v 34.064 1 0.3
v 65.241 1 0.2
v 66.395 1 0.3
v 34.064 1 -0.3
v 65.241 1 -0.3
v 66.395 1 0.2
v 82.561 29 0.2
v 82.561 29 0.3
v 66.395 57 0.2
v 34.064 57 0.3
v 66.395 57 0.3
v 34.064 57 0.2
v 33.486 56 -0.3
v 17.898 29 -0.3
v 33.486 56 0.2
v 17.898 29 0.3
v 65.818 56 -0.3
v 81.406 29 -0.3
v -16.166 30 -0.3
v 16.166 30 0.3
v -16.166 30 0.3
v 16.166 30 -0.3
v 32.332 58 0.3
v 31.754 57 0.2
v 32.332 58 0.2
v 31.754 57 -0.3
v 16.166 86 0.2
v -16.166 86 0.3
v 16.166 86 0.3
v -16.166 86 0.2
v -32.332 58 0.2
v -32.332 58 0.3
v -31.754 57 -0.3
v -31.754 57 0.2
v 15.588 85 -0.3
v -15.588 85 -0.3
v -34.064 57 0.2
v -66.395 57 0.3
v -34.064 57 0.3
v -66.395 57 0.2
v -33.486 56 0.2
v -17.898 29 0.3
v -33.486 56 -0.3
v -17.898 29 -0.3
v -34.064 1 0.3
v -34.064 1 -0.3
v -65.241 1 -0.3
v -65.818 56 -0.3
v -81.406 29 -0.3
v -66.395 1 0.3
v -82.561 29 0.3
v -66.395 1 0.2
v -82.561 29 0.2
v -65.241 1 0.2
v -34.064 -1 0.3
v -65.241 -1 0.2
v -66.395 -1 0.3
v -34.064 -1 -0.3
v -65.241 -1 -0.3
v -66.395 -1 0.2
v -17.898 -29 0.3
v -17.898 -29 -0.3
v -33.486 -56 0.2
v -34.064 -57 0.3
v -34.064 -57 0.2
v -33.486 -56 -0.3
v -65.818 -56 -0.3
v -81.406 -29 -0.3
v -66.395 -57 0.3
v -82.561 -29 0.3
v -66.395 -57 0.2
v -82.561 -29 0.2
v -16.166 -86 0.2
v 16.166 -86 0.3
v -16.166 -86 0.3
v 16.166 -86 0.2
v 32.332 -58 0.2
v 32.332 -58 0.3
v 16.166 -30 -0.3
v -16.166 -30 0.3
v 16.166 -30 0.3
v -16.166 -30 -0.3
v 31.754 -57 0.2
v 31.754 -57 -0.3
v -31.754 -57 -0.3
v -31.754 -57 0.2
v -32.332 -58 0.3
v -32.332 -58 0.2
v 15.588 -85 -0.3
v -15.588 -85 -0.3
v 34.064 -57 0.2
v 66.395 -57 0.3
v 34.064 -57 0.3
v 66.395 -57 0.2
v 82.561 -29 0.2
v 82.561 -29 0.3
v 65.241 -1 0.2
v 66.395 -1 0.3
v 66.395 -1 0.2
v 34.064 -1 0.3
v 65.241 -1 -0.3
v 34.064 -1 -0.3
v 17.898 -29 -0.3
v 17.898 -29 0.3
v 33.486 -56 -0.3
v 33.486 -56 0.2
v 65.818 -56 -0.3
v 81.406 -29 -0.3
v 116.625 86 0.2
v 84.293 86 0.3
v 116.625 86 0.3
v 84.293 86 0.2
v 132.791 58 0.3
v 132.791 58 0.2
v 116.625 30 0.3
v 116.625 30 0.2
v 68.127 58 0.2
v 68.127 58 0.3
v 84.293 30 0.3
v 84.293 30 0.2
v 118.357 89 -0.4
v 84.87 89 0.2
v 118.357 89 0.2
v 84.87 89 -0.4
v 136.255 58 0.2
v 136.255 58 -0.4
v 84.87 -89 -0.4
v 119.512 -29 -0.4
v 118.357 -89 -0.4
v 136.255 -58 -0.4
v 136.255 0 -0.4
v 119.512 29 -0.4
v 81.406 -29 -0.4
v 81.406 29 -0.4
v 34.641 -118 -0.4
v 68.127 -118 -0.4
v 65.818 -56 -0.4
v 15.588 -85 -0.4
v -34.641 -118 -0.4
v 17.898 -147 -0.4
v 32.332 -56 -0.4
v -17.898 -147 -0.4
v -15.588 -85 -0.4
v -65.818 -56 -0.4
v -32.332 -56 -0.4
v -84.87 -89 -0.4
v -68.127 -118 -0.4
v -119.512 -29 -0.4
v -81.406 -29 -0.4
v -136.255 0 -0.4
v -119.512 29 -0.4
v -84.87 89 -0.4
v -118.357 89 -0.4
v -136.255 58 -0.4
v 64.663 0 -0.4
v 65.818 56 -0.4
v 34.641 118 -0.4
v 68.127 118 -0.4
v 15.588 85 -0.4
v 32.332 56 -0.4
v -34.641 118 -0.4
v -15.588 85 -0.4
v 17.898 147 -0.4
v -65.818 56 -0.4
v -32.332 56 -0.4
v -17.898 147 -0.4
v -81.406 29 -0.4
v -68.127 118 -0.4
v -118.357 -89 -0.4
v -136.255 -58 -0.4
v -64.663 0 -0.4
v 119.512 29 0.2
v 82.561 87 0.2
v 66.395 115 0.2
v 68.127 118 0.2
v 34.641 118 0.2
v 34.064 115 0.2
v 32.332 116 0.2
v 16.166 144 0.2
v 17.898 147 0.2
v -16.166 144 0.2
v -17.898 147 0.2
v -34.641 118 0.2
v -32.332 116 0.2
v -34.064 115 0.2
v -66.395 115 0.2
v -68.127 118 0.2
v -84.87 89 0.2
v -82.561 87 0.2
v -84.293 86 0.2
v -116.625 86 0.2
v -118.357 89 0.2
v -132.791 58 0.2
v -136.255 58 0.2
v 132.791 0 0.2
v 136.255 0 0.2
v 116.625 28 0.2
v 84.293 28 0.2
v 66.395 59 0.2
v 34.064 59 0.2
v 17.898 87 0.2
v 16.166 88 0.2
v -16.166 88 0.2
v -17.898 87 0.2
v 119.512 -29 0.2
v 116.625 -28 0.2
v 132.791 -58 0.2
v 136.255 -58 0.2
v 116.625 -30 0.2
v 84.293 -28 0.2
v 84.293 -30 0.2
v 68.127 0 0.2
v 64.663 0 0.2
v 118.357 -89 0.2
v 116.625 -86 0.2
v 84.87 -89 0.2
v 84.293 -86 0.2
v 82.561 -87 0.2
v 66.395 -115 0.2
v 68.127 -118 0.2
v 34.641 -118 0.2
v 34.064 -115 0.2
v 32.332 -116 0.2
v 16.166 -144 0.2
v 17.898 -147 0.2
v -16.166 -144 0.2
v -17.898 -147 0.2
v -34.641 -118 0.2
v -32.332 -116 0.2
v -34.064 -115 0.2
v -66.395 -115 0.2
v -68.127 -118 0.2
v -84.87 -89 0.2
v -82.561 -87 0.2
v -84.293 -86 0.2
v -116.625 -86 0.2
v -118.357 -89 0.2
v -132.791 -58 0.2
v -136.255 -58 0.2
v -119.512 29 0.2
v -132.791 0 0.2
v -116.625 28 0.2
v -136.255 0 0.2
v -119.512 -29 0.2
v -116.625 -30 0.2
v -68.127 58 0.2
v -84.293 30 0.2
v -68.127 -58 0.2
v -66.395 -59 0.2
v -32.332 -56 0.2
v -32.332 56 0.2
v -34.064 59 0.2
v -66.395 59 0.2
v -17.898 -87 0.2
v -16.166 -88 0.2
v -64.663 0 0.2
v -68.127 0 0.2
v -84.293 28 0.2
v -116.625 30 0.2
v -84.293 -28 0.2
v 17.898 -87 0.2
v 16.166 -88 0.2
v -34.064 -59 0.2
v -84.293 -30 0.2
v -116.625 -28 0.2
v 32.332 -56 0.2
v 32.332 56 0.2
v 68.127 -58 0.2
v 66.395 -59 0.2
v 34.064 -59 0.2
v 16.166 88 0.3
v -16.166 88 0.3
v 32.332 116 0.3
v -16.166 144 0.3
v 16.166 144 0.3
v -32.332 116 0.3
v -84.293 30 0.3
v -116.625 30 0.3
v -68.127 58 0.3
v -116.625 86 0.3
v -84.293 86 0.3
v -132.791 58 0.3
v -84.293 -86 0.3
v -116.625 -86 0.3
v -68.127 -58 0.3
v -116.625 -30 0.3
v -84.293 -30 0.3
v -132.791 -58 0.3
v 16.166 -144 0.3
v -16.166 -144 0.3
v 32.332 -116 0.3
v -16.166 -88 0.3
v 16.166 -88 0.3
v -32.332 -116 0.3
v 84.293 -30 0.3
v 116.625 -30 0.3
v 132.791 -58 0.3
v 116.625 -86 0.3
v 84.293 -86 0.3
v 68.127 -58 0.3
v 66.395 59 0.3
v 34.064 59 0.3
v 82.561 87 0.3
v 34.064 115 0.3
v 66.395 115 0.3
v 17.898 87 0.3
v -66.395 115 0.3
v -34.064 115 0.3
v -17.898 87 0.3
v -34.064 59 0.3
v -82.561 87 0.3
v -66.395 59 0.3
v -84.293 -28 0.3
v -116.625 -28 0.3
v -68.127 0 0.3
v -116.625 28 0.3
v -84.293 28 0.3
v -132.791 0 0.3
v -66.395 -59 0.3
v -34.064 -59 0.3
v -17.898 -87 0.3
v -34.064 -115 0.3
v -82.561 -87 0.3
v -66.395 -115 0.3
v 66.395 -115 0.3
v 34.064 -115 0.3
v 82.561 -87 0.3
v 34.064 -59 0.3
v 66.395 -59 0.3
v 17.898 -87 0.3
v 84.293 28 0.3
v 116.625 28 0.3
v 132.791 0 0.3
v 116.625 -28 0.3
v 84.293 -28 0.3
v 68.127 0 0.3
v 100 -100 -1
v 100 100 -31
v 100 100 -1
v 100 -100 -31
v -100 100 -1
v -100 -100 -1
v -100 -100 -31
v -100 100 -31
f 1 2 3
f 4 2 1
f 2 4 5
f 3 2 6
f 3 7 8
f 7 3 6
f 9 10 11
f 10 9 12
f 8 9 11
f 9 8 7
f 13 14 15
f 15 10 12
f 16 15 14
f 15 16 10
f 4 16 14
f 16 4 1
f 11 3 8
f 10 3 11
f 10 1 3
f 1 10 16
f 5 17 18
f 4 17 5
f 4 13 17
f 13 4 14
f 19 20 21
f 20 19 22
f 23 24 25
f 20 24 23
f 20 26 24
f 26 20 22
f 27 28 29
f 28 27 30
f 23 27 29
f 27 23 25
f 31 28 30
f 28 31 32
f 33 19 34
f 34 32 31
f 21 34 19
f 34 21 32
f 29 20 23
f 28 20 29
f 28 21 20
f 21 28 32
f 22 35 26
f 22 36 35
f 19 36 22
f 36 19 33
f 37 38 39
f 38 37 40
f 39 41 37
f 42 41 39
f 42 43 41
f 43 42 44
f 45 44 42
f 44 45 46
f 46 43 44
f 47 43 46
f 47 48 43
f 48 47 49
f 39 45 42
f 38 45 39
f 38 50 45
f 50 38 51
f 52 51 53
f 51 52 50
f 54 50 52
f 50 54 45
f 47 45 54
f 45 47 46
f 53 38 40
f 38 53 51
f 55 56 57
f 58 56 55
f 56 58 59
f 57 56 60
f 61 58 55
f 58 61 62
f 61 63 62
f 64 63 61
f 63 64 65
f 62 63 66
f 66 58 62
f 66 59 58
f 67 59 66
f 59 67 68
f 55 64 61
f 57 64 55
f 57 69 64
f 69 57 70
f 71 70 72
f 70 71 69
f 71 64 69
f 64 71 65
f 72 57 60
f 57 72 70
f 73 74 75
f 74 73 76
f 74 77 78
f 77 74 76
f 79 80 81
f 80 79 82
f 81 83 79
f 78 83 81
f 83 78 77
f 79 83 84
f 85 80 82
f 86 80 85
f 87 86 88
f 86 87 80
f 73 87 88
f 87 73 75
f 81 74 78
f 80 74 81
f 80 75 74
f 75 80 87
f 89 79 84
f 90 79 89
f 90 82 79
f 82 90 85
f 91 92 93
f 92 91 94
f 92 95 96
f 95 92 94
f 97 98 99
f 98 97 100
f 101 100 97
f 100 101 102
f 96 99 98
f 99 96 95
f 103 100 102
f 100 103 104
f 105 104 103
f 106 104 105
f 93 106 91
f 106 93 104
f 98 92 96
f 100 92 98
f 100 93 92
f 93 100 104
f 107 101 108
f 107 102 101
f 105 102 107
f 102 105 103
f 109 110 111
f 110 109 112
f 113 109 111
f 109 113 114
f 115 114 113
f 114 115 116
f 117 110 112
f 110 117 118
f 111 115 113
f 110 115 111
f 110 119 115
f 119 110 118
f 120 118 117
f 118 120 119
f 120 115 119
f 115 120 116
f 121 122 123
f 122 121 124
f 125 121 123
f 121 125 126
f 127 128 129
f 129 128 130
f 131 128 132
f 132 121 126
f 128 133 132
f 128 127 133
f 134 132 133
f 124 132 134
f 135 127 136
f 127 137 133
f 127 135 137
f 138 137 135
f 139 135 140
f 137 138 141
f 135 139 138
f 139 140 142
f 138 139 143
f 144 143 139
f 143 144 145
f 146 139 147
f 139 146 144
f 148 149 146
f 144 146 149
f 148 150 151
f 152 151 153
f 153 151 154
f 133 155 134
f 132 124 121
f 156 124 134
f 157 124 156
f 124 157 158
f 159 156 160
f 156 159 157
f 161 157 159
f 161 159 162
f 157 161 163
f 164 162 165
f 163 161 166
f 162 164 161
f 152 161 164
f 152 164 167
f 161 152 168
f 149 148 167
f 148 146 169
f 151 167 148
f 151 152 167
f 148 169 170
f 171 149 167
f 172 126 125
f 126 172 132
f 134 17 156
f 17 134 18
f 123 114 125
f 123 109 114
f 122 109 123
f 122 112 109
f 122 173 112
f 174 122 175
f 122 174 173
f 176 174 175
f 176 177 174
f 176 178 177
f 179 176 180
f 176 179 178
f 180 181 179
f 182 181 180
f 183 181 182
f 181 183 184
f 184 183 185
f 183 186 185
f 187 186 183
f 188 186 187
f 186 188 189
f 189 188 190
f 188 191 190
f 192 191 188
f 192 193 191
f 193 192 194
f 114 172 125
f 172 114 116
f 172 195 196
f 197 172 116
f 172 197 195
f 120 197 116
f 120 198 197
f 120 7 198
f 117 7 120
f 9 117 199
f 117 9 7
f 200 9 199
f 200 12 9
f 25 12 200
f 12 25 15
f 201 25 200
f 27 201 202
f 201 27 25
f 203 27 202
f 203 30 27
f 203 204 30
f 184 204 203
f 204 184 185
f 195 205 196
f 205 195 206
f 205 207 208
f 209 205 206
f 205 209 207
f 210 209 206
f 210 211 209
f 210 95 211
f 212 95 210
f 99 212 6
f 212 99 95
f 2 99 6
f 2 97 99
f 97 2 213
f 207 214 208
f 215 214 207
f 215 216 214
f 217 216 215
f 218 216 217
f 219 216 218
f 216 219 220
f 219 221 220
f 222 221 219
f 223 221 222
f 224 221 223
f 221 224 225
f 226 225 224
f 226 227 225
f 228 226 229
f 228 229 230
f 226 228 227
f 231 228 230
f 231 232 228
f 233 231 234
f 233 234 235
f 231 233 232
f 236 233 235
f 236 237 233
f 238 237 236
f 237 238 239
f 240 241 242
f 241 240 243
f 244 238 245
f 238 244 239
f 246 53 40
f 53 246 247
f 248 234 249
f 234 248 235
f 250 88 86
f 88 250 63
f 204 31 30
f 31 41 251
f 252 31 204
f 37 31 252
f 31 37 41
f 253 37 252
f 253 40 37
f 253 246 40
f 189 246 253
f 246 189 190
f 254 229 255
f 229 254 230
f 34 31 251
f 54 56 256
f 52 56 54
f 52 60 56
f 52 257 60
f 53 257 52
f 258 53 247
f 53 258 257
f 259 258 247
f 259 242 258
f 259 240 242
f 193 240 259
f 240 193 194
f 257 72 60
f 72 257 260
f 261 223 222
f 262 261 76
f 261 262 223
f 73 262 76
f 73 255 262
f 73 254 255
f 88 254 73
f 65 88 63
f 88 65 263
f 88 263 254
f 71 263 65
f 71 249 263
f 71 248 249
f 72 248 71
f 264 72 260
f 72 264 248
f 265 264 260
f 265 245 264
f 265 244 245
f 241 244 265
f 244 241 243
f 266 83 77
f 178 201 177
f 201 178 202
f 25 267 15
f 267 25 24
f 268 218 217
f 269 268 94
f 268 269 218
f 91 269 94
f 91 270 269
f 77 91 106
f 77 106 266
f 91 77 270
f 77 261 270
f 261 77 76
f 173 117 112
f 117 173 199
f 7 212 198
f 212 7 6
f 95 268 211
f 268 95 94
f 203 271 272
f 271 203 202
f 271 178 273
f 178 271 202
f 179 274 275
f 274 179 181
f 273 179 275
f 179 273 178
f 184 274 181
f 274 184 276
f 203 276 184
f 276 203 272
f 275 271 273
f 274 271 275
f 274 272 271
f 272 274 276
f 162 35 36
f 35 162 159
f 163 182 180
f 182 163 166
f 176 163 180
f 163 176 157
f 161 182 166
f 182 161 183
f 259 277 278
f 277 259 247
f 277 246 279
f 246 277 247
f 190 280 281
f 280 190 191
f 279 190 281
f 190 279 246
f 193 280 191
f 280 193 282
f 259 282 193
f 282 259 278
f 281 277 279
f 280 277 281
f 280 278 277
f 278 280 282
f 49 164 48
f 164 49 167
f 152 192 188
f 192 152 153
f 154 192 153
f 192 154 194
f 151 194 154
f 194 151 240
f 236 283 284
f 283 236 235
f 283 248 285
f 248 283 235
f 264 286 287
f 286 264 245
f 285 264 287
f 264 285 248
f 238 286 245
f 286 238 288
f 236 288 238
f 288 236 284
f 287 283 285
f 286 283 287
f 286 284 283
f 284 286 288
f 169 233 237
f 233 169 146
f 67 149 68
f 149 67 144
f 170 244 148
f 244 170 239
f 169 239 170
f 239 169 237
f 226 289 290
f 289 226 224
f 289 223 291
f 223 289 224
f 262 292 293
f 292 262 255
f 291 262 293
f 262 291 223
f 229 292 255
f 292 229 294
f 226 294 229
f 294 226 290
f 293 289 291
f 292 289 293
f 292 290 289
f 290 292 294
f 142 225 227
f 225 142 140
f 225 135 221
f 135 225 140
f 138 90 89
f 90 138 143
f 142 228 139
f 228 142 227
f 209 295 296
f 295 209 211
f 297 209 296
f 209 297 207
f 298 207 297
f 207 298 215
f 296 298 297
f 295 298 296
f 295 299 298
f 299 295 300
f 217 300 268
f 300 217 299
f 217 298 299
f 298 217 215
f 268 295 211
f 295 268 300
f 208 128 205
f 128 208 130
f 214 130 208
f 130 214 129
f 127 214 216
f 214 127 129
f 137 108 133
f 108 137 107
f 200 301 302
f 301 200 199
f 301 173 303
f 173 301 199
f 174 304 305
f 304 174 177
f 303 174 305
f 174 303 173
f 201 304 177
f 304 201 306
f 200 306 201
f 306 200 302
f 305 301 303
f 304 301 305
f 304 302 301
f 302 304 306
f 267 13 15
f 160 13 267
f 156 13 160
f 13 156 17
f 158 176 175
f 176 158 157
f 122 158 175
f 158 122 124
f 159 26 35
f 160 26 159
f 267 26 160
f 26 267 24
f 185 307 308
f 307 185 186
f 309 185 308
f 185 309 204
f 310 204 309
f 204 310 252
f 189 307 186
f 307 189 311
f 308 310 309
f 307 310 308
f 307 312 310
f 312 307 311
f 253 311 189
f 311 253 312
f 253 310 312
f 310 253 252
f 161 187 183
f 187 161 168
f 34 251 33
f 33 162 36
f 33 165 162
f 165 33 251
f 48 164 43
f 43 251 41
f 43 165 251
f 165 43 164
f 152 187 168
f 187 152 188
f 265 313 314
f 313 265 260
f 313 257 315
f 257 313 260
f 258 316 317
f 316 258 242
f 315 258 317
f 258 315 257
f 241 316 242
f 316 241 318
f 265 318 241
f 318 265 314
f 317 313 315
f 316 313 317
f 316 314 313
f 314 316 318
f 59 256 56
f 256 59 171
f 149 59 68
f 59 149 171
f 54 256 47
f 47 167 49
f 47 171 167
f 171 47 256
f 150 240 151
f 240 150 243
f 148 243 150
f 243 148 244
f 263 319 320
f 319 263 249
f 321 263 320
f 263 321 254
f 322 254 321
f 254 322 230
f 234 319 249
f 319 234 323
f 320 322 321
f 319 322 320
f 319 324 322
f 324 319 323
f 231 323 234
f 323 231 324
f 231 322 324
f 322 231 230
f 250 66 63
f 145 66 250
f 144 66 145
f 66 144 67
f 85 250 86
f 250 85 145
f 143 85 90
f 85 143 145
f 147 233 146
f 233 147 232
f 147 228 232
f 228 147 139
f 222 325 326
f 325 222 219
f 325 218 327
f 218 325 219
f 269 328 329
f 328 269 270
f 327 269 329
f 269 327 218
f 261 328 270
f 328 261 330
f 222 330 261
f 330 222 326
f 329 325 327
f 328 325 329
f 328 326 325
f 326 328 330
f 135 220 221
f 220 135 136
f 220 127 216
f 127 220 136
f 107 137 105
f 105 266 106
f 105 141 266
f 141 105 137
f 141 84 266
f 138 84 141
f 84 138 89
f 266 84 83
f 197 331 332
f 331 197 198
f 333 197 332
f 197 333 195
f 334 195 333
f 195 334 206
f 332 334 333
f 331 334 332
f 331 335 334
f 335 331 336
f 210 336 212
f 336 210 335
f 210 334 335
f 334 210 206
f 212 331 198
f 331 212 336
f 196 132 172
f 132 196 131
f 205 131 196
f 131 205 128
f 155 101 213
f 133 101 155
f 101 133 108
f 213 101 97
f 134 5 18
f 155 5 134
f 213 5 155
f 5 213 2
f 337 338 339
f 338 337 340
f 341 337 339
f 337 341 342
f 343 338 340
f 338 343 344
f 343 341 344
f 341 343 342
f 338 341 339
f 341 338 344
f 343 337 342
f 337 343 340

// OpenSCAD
/*
small_radius1 = 86/2;
internal_border=2;
externalBorder = 10;
*/

small_radius1 = 56/2;
internal_border=2;
externalBorder = 3;

small_radius2 = small_radius1 + internal_border/2;
small_radius3= small_radius1 + externalBorder;

big_radius1= (2 * small_radius1)/sqrt(3);
big_radius2= (2 * small_radius2)/sqrt(3);
big_radius3= (2 * small_radius3)/sqrt(3);

echo("big_radius is : ",big_radius2);
borderHeight = 0.1;
height = 0.6;


x_cube = 200;
y_cube = 200;
color([0.1,0.1,0.1])
translate([-x_cube/2,-y_cube/2, -31]){
    cube([x_cube, y_cube, 30]);
}

//projection(){
    
    //color([0,1,0]) cylinder(r=small_radius1*3, h=height, $fn=6,center = true);

echo("MIRROR INTERNAL");
// from 0 to 360 in step of 60
for ( angle = [0 : 60 : 359] ){
    x = (small_radius2) * 2 * cos(angle + 30);
    y = (small_radius2) * 2 * sin(angle + 30);
    echo("x ", x, " and y ", y)
    translate([x,y,0]){
        //color([1,0,0]) //red
        //cylinder(r=radius + distance, h=height-0.1, $fn=6,center = true);
            
        color([0,1,0]) //green
        cylinder(r=big_radius1, h=height, $fn=6,center = true);
    }
}
/*
translate([x,y,-0.2]){
cylinder(r=100, h=height, $fn=6,center = true);
}*/

echo("MIRROR EXTERNAL 1");
// from 0 to 360 in step of 60
for ( angle = [0 : 60 : 359] ){
    x = (small_radius2) * 4 * cos(angle + 30);
    y = (small_radius2) * 4 * sin(angle + 30);
    echo("x ", x, " and y ", y)
    translate([x,y,0]){
        //color([1,0,0]) //red
        //cylinder(r=radius + distance, h=height-0.1, $fn=6,center = true);
            
        color([0,1,0]) //green
        cylinder(r=big_radius1, h=height, $fn=6,center = true);
        
    }
    translate([x,y,-0.1]) cylinder(r=big_radius3, h=height, $fn=6,center = true);
}

echo("MIRROR EXTERNAL 2");
// from 30 to 360 in step of 60
for ( angle = [30 : 60 : 359] ){
    x = (big_radius2 * 3) * cos(angle + 30);
    y = (big_radius2 * 3) * sin(angle + 30);
    echo("x ", x, " and y ", y)
    translate([x,y,0]){
        //color([1,0,0]) //red
        //cylinder(r=radius + distance, h=height-0.1, $fn=6,center = true);
            
        color([0,1,0]) //green
        cylinder(r=big_radius1, h=height, $fn=6,center = true);
    }
    translate([x,y,-0.1]) cylinder(r=big_radius3, h=height, $fn=6,center = true);
}

//}
